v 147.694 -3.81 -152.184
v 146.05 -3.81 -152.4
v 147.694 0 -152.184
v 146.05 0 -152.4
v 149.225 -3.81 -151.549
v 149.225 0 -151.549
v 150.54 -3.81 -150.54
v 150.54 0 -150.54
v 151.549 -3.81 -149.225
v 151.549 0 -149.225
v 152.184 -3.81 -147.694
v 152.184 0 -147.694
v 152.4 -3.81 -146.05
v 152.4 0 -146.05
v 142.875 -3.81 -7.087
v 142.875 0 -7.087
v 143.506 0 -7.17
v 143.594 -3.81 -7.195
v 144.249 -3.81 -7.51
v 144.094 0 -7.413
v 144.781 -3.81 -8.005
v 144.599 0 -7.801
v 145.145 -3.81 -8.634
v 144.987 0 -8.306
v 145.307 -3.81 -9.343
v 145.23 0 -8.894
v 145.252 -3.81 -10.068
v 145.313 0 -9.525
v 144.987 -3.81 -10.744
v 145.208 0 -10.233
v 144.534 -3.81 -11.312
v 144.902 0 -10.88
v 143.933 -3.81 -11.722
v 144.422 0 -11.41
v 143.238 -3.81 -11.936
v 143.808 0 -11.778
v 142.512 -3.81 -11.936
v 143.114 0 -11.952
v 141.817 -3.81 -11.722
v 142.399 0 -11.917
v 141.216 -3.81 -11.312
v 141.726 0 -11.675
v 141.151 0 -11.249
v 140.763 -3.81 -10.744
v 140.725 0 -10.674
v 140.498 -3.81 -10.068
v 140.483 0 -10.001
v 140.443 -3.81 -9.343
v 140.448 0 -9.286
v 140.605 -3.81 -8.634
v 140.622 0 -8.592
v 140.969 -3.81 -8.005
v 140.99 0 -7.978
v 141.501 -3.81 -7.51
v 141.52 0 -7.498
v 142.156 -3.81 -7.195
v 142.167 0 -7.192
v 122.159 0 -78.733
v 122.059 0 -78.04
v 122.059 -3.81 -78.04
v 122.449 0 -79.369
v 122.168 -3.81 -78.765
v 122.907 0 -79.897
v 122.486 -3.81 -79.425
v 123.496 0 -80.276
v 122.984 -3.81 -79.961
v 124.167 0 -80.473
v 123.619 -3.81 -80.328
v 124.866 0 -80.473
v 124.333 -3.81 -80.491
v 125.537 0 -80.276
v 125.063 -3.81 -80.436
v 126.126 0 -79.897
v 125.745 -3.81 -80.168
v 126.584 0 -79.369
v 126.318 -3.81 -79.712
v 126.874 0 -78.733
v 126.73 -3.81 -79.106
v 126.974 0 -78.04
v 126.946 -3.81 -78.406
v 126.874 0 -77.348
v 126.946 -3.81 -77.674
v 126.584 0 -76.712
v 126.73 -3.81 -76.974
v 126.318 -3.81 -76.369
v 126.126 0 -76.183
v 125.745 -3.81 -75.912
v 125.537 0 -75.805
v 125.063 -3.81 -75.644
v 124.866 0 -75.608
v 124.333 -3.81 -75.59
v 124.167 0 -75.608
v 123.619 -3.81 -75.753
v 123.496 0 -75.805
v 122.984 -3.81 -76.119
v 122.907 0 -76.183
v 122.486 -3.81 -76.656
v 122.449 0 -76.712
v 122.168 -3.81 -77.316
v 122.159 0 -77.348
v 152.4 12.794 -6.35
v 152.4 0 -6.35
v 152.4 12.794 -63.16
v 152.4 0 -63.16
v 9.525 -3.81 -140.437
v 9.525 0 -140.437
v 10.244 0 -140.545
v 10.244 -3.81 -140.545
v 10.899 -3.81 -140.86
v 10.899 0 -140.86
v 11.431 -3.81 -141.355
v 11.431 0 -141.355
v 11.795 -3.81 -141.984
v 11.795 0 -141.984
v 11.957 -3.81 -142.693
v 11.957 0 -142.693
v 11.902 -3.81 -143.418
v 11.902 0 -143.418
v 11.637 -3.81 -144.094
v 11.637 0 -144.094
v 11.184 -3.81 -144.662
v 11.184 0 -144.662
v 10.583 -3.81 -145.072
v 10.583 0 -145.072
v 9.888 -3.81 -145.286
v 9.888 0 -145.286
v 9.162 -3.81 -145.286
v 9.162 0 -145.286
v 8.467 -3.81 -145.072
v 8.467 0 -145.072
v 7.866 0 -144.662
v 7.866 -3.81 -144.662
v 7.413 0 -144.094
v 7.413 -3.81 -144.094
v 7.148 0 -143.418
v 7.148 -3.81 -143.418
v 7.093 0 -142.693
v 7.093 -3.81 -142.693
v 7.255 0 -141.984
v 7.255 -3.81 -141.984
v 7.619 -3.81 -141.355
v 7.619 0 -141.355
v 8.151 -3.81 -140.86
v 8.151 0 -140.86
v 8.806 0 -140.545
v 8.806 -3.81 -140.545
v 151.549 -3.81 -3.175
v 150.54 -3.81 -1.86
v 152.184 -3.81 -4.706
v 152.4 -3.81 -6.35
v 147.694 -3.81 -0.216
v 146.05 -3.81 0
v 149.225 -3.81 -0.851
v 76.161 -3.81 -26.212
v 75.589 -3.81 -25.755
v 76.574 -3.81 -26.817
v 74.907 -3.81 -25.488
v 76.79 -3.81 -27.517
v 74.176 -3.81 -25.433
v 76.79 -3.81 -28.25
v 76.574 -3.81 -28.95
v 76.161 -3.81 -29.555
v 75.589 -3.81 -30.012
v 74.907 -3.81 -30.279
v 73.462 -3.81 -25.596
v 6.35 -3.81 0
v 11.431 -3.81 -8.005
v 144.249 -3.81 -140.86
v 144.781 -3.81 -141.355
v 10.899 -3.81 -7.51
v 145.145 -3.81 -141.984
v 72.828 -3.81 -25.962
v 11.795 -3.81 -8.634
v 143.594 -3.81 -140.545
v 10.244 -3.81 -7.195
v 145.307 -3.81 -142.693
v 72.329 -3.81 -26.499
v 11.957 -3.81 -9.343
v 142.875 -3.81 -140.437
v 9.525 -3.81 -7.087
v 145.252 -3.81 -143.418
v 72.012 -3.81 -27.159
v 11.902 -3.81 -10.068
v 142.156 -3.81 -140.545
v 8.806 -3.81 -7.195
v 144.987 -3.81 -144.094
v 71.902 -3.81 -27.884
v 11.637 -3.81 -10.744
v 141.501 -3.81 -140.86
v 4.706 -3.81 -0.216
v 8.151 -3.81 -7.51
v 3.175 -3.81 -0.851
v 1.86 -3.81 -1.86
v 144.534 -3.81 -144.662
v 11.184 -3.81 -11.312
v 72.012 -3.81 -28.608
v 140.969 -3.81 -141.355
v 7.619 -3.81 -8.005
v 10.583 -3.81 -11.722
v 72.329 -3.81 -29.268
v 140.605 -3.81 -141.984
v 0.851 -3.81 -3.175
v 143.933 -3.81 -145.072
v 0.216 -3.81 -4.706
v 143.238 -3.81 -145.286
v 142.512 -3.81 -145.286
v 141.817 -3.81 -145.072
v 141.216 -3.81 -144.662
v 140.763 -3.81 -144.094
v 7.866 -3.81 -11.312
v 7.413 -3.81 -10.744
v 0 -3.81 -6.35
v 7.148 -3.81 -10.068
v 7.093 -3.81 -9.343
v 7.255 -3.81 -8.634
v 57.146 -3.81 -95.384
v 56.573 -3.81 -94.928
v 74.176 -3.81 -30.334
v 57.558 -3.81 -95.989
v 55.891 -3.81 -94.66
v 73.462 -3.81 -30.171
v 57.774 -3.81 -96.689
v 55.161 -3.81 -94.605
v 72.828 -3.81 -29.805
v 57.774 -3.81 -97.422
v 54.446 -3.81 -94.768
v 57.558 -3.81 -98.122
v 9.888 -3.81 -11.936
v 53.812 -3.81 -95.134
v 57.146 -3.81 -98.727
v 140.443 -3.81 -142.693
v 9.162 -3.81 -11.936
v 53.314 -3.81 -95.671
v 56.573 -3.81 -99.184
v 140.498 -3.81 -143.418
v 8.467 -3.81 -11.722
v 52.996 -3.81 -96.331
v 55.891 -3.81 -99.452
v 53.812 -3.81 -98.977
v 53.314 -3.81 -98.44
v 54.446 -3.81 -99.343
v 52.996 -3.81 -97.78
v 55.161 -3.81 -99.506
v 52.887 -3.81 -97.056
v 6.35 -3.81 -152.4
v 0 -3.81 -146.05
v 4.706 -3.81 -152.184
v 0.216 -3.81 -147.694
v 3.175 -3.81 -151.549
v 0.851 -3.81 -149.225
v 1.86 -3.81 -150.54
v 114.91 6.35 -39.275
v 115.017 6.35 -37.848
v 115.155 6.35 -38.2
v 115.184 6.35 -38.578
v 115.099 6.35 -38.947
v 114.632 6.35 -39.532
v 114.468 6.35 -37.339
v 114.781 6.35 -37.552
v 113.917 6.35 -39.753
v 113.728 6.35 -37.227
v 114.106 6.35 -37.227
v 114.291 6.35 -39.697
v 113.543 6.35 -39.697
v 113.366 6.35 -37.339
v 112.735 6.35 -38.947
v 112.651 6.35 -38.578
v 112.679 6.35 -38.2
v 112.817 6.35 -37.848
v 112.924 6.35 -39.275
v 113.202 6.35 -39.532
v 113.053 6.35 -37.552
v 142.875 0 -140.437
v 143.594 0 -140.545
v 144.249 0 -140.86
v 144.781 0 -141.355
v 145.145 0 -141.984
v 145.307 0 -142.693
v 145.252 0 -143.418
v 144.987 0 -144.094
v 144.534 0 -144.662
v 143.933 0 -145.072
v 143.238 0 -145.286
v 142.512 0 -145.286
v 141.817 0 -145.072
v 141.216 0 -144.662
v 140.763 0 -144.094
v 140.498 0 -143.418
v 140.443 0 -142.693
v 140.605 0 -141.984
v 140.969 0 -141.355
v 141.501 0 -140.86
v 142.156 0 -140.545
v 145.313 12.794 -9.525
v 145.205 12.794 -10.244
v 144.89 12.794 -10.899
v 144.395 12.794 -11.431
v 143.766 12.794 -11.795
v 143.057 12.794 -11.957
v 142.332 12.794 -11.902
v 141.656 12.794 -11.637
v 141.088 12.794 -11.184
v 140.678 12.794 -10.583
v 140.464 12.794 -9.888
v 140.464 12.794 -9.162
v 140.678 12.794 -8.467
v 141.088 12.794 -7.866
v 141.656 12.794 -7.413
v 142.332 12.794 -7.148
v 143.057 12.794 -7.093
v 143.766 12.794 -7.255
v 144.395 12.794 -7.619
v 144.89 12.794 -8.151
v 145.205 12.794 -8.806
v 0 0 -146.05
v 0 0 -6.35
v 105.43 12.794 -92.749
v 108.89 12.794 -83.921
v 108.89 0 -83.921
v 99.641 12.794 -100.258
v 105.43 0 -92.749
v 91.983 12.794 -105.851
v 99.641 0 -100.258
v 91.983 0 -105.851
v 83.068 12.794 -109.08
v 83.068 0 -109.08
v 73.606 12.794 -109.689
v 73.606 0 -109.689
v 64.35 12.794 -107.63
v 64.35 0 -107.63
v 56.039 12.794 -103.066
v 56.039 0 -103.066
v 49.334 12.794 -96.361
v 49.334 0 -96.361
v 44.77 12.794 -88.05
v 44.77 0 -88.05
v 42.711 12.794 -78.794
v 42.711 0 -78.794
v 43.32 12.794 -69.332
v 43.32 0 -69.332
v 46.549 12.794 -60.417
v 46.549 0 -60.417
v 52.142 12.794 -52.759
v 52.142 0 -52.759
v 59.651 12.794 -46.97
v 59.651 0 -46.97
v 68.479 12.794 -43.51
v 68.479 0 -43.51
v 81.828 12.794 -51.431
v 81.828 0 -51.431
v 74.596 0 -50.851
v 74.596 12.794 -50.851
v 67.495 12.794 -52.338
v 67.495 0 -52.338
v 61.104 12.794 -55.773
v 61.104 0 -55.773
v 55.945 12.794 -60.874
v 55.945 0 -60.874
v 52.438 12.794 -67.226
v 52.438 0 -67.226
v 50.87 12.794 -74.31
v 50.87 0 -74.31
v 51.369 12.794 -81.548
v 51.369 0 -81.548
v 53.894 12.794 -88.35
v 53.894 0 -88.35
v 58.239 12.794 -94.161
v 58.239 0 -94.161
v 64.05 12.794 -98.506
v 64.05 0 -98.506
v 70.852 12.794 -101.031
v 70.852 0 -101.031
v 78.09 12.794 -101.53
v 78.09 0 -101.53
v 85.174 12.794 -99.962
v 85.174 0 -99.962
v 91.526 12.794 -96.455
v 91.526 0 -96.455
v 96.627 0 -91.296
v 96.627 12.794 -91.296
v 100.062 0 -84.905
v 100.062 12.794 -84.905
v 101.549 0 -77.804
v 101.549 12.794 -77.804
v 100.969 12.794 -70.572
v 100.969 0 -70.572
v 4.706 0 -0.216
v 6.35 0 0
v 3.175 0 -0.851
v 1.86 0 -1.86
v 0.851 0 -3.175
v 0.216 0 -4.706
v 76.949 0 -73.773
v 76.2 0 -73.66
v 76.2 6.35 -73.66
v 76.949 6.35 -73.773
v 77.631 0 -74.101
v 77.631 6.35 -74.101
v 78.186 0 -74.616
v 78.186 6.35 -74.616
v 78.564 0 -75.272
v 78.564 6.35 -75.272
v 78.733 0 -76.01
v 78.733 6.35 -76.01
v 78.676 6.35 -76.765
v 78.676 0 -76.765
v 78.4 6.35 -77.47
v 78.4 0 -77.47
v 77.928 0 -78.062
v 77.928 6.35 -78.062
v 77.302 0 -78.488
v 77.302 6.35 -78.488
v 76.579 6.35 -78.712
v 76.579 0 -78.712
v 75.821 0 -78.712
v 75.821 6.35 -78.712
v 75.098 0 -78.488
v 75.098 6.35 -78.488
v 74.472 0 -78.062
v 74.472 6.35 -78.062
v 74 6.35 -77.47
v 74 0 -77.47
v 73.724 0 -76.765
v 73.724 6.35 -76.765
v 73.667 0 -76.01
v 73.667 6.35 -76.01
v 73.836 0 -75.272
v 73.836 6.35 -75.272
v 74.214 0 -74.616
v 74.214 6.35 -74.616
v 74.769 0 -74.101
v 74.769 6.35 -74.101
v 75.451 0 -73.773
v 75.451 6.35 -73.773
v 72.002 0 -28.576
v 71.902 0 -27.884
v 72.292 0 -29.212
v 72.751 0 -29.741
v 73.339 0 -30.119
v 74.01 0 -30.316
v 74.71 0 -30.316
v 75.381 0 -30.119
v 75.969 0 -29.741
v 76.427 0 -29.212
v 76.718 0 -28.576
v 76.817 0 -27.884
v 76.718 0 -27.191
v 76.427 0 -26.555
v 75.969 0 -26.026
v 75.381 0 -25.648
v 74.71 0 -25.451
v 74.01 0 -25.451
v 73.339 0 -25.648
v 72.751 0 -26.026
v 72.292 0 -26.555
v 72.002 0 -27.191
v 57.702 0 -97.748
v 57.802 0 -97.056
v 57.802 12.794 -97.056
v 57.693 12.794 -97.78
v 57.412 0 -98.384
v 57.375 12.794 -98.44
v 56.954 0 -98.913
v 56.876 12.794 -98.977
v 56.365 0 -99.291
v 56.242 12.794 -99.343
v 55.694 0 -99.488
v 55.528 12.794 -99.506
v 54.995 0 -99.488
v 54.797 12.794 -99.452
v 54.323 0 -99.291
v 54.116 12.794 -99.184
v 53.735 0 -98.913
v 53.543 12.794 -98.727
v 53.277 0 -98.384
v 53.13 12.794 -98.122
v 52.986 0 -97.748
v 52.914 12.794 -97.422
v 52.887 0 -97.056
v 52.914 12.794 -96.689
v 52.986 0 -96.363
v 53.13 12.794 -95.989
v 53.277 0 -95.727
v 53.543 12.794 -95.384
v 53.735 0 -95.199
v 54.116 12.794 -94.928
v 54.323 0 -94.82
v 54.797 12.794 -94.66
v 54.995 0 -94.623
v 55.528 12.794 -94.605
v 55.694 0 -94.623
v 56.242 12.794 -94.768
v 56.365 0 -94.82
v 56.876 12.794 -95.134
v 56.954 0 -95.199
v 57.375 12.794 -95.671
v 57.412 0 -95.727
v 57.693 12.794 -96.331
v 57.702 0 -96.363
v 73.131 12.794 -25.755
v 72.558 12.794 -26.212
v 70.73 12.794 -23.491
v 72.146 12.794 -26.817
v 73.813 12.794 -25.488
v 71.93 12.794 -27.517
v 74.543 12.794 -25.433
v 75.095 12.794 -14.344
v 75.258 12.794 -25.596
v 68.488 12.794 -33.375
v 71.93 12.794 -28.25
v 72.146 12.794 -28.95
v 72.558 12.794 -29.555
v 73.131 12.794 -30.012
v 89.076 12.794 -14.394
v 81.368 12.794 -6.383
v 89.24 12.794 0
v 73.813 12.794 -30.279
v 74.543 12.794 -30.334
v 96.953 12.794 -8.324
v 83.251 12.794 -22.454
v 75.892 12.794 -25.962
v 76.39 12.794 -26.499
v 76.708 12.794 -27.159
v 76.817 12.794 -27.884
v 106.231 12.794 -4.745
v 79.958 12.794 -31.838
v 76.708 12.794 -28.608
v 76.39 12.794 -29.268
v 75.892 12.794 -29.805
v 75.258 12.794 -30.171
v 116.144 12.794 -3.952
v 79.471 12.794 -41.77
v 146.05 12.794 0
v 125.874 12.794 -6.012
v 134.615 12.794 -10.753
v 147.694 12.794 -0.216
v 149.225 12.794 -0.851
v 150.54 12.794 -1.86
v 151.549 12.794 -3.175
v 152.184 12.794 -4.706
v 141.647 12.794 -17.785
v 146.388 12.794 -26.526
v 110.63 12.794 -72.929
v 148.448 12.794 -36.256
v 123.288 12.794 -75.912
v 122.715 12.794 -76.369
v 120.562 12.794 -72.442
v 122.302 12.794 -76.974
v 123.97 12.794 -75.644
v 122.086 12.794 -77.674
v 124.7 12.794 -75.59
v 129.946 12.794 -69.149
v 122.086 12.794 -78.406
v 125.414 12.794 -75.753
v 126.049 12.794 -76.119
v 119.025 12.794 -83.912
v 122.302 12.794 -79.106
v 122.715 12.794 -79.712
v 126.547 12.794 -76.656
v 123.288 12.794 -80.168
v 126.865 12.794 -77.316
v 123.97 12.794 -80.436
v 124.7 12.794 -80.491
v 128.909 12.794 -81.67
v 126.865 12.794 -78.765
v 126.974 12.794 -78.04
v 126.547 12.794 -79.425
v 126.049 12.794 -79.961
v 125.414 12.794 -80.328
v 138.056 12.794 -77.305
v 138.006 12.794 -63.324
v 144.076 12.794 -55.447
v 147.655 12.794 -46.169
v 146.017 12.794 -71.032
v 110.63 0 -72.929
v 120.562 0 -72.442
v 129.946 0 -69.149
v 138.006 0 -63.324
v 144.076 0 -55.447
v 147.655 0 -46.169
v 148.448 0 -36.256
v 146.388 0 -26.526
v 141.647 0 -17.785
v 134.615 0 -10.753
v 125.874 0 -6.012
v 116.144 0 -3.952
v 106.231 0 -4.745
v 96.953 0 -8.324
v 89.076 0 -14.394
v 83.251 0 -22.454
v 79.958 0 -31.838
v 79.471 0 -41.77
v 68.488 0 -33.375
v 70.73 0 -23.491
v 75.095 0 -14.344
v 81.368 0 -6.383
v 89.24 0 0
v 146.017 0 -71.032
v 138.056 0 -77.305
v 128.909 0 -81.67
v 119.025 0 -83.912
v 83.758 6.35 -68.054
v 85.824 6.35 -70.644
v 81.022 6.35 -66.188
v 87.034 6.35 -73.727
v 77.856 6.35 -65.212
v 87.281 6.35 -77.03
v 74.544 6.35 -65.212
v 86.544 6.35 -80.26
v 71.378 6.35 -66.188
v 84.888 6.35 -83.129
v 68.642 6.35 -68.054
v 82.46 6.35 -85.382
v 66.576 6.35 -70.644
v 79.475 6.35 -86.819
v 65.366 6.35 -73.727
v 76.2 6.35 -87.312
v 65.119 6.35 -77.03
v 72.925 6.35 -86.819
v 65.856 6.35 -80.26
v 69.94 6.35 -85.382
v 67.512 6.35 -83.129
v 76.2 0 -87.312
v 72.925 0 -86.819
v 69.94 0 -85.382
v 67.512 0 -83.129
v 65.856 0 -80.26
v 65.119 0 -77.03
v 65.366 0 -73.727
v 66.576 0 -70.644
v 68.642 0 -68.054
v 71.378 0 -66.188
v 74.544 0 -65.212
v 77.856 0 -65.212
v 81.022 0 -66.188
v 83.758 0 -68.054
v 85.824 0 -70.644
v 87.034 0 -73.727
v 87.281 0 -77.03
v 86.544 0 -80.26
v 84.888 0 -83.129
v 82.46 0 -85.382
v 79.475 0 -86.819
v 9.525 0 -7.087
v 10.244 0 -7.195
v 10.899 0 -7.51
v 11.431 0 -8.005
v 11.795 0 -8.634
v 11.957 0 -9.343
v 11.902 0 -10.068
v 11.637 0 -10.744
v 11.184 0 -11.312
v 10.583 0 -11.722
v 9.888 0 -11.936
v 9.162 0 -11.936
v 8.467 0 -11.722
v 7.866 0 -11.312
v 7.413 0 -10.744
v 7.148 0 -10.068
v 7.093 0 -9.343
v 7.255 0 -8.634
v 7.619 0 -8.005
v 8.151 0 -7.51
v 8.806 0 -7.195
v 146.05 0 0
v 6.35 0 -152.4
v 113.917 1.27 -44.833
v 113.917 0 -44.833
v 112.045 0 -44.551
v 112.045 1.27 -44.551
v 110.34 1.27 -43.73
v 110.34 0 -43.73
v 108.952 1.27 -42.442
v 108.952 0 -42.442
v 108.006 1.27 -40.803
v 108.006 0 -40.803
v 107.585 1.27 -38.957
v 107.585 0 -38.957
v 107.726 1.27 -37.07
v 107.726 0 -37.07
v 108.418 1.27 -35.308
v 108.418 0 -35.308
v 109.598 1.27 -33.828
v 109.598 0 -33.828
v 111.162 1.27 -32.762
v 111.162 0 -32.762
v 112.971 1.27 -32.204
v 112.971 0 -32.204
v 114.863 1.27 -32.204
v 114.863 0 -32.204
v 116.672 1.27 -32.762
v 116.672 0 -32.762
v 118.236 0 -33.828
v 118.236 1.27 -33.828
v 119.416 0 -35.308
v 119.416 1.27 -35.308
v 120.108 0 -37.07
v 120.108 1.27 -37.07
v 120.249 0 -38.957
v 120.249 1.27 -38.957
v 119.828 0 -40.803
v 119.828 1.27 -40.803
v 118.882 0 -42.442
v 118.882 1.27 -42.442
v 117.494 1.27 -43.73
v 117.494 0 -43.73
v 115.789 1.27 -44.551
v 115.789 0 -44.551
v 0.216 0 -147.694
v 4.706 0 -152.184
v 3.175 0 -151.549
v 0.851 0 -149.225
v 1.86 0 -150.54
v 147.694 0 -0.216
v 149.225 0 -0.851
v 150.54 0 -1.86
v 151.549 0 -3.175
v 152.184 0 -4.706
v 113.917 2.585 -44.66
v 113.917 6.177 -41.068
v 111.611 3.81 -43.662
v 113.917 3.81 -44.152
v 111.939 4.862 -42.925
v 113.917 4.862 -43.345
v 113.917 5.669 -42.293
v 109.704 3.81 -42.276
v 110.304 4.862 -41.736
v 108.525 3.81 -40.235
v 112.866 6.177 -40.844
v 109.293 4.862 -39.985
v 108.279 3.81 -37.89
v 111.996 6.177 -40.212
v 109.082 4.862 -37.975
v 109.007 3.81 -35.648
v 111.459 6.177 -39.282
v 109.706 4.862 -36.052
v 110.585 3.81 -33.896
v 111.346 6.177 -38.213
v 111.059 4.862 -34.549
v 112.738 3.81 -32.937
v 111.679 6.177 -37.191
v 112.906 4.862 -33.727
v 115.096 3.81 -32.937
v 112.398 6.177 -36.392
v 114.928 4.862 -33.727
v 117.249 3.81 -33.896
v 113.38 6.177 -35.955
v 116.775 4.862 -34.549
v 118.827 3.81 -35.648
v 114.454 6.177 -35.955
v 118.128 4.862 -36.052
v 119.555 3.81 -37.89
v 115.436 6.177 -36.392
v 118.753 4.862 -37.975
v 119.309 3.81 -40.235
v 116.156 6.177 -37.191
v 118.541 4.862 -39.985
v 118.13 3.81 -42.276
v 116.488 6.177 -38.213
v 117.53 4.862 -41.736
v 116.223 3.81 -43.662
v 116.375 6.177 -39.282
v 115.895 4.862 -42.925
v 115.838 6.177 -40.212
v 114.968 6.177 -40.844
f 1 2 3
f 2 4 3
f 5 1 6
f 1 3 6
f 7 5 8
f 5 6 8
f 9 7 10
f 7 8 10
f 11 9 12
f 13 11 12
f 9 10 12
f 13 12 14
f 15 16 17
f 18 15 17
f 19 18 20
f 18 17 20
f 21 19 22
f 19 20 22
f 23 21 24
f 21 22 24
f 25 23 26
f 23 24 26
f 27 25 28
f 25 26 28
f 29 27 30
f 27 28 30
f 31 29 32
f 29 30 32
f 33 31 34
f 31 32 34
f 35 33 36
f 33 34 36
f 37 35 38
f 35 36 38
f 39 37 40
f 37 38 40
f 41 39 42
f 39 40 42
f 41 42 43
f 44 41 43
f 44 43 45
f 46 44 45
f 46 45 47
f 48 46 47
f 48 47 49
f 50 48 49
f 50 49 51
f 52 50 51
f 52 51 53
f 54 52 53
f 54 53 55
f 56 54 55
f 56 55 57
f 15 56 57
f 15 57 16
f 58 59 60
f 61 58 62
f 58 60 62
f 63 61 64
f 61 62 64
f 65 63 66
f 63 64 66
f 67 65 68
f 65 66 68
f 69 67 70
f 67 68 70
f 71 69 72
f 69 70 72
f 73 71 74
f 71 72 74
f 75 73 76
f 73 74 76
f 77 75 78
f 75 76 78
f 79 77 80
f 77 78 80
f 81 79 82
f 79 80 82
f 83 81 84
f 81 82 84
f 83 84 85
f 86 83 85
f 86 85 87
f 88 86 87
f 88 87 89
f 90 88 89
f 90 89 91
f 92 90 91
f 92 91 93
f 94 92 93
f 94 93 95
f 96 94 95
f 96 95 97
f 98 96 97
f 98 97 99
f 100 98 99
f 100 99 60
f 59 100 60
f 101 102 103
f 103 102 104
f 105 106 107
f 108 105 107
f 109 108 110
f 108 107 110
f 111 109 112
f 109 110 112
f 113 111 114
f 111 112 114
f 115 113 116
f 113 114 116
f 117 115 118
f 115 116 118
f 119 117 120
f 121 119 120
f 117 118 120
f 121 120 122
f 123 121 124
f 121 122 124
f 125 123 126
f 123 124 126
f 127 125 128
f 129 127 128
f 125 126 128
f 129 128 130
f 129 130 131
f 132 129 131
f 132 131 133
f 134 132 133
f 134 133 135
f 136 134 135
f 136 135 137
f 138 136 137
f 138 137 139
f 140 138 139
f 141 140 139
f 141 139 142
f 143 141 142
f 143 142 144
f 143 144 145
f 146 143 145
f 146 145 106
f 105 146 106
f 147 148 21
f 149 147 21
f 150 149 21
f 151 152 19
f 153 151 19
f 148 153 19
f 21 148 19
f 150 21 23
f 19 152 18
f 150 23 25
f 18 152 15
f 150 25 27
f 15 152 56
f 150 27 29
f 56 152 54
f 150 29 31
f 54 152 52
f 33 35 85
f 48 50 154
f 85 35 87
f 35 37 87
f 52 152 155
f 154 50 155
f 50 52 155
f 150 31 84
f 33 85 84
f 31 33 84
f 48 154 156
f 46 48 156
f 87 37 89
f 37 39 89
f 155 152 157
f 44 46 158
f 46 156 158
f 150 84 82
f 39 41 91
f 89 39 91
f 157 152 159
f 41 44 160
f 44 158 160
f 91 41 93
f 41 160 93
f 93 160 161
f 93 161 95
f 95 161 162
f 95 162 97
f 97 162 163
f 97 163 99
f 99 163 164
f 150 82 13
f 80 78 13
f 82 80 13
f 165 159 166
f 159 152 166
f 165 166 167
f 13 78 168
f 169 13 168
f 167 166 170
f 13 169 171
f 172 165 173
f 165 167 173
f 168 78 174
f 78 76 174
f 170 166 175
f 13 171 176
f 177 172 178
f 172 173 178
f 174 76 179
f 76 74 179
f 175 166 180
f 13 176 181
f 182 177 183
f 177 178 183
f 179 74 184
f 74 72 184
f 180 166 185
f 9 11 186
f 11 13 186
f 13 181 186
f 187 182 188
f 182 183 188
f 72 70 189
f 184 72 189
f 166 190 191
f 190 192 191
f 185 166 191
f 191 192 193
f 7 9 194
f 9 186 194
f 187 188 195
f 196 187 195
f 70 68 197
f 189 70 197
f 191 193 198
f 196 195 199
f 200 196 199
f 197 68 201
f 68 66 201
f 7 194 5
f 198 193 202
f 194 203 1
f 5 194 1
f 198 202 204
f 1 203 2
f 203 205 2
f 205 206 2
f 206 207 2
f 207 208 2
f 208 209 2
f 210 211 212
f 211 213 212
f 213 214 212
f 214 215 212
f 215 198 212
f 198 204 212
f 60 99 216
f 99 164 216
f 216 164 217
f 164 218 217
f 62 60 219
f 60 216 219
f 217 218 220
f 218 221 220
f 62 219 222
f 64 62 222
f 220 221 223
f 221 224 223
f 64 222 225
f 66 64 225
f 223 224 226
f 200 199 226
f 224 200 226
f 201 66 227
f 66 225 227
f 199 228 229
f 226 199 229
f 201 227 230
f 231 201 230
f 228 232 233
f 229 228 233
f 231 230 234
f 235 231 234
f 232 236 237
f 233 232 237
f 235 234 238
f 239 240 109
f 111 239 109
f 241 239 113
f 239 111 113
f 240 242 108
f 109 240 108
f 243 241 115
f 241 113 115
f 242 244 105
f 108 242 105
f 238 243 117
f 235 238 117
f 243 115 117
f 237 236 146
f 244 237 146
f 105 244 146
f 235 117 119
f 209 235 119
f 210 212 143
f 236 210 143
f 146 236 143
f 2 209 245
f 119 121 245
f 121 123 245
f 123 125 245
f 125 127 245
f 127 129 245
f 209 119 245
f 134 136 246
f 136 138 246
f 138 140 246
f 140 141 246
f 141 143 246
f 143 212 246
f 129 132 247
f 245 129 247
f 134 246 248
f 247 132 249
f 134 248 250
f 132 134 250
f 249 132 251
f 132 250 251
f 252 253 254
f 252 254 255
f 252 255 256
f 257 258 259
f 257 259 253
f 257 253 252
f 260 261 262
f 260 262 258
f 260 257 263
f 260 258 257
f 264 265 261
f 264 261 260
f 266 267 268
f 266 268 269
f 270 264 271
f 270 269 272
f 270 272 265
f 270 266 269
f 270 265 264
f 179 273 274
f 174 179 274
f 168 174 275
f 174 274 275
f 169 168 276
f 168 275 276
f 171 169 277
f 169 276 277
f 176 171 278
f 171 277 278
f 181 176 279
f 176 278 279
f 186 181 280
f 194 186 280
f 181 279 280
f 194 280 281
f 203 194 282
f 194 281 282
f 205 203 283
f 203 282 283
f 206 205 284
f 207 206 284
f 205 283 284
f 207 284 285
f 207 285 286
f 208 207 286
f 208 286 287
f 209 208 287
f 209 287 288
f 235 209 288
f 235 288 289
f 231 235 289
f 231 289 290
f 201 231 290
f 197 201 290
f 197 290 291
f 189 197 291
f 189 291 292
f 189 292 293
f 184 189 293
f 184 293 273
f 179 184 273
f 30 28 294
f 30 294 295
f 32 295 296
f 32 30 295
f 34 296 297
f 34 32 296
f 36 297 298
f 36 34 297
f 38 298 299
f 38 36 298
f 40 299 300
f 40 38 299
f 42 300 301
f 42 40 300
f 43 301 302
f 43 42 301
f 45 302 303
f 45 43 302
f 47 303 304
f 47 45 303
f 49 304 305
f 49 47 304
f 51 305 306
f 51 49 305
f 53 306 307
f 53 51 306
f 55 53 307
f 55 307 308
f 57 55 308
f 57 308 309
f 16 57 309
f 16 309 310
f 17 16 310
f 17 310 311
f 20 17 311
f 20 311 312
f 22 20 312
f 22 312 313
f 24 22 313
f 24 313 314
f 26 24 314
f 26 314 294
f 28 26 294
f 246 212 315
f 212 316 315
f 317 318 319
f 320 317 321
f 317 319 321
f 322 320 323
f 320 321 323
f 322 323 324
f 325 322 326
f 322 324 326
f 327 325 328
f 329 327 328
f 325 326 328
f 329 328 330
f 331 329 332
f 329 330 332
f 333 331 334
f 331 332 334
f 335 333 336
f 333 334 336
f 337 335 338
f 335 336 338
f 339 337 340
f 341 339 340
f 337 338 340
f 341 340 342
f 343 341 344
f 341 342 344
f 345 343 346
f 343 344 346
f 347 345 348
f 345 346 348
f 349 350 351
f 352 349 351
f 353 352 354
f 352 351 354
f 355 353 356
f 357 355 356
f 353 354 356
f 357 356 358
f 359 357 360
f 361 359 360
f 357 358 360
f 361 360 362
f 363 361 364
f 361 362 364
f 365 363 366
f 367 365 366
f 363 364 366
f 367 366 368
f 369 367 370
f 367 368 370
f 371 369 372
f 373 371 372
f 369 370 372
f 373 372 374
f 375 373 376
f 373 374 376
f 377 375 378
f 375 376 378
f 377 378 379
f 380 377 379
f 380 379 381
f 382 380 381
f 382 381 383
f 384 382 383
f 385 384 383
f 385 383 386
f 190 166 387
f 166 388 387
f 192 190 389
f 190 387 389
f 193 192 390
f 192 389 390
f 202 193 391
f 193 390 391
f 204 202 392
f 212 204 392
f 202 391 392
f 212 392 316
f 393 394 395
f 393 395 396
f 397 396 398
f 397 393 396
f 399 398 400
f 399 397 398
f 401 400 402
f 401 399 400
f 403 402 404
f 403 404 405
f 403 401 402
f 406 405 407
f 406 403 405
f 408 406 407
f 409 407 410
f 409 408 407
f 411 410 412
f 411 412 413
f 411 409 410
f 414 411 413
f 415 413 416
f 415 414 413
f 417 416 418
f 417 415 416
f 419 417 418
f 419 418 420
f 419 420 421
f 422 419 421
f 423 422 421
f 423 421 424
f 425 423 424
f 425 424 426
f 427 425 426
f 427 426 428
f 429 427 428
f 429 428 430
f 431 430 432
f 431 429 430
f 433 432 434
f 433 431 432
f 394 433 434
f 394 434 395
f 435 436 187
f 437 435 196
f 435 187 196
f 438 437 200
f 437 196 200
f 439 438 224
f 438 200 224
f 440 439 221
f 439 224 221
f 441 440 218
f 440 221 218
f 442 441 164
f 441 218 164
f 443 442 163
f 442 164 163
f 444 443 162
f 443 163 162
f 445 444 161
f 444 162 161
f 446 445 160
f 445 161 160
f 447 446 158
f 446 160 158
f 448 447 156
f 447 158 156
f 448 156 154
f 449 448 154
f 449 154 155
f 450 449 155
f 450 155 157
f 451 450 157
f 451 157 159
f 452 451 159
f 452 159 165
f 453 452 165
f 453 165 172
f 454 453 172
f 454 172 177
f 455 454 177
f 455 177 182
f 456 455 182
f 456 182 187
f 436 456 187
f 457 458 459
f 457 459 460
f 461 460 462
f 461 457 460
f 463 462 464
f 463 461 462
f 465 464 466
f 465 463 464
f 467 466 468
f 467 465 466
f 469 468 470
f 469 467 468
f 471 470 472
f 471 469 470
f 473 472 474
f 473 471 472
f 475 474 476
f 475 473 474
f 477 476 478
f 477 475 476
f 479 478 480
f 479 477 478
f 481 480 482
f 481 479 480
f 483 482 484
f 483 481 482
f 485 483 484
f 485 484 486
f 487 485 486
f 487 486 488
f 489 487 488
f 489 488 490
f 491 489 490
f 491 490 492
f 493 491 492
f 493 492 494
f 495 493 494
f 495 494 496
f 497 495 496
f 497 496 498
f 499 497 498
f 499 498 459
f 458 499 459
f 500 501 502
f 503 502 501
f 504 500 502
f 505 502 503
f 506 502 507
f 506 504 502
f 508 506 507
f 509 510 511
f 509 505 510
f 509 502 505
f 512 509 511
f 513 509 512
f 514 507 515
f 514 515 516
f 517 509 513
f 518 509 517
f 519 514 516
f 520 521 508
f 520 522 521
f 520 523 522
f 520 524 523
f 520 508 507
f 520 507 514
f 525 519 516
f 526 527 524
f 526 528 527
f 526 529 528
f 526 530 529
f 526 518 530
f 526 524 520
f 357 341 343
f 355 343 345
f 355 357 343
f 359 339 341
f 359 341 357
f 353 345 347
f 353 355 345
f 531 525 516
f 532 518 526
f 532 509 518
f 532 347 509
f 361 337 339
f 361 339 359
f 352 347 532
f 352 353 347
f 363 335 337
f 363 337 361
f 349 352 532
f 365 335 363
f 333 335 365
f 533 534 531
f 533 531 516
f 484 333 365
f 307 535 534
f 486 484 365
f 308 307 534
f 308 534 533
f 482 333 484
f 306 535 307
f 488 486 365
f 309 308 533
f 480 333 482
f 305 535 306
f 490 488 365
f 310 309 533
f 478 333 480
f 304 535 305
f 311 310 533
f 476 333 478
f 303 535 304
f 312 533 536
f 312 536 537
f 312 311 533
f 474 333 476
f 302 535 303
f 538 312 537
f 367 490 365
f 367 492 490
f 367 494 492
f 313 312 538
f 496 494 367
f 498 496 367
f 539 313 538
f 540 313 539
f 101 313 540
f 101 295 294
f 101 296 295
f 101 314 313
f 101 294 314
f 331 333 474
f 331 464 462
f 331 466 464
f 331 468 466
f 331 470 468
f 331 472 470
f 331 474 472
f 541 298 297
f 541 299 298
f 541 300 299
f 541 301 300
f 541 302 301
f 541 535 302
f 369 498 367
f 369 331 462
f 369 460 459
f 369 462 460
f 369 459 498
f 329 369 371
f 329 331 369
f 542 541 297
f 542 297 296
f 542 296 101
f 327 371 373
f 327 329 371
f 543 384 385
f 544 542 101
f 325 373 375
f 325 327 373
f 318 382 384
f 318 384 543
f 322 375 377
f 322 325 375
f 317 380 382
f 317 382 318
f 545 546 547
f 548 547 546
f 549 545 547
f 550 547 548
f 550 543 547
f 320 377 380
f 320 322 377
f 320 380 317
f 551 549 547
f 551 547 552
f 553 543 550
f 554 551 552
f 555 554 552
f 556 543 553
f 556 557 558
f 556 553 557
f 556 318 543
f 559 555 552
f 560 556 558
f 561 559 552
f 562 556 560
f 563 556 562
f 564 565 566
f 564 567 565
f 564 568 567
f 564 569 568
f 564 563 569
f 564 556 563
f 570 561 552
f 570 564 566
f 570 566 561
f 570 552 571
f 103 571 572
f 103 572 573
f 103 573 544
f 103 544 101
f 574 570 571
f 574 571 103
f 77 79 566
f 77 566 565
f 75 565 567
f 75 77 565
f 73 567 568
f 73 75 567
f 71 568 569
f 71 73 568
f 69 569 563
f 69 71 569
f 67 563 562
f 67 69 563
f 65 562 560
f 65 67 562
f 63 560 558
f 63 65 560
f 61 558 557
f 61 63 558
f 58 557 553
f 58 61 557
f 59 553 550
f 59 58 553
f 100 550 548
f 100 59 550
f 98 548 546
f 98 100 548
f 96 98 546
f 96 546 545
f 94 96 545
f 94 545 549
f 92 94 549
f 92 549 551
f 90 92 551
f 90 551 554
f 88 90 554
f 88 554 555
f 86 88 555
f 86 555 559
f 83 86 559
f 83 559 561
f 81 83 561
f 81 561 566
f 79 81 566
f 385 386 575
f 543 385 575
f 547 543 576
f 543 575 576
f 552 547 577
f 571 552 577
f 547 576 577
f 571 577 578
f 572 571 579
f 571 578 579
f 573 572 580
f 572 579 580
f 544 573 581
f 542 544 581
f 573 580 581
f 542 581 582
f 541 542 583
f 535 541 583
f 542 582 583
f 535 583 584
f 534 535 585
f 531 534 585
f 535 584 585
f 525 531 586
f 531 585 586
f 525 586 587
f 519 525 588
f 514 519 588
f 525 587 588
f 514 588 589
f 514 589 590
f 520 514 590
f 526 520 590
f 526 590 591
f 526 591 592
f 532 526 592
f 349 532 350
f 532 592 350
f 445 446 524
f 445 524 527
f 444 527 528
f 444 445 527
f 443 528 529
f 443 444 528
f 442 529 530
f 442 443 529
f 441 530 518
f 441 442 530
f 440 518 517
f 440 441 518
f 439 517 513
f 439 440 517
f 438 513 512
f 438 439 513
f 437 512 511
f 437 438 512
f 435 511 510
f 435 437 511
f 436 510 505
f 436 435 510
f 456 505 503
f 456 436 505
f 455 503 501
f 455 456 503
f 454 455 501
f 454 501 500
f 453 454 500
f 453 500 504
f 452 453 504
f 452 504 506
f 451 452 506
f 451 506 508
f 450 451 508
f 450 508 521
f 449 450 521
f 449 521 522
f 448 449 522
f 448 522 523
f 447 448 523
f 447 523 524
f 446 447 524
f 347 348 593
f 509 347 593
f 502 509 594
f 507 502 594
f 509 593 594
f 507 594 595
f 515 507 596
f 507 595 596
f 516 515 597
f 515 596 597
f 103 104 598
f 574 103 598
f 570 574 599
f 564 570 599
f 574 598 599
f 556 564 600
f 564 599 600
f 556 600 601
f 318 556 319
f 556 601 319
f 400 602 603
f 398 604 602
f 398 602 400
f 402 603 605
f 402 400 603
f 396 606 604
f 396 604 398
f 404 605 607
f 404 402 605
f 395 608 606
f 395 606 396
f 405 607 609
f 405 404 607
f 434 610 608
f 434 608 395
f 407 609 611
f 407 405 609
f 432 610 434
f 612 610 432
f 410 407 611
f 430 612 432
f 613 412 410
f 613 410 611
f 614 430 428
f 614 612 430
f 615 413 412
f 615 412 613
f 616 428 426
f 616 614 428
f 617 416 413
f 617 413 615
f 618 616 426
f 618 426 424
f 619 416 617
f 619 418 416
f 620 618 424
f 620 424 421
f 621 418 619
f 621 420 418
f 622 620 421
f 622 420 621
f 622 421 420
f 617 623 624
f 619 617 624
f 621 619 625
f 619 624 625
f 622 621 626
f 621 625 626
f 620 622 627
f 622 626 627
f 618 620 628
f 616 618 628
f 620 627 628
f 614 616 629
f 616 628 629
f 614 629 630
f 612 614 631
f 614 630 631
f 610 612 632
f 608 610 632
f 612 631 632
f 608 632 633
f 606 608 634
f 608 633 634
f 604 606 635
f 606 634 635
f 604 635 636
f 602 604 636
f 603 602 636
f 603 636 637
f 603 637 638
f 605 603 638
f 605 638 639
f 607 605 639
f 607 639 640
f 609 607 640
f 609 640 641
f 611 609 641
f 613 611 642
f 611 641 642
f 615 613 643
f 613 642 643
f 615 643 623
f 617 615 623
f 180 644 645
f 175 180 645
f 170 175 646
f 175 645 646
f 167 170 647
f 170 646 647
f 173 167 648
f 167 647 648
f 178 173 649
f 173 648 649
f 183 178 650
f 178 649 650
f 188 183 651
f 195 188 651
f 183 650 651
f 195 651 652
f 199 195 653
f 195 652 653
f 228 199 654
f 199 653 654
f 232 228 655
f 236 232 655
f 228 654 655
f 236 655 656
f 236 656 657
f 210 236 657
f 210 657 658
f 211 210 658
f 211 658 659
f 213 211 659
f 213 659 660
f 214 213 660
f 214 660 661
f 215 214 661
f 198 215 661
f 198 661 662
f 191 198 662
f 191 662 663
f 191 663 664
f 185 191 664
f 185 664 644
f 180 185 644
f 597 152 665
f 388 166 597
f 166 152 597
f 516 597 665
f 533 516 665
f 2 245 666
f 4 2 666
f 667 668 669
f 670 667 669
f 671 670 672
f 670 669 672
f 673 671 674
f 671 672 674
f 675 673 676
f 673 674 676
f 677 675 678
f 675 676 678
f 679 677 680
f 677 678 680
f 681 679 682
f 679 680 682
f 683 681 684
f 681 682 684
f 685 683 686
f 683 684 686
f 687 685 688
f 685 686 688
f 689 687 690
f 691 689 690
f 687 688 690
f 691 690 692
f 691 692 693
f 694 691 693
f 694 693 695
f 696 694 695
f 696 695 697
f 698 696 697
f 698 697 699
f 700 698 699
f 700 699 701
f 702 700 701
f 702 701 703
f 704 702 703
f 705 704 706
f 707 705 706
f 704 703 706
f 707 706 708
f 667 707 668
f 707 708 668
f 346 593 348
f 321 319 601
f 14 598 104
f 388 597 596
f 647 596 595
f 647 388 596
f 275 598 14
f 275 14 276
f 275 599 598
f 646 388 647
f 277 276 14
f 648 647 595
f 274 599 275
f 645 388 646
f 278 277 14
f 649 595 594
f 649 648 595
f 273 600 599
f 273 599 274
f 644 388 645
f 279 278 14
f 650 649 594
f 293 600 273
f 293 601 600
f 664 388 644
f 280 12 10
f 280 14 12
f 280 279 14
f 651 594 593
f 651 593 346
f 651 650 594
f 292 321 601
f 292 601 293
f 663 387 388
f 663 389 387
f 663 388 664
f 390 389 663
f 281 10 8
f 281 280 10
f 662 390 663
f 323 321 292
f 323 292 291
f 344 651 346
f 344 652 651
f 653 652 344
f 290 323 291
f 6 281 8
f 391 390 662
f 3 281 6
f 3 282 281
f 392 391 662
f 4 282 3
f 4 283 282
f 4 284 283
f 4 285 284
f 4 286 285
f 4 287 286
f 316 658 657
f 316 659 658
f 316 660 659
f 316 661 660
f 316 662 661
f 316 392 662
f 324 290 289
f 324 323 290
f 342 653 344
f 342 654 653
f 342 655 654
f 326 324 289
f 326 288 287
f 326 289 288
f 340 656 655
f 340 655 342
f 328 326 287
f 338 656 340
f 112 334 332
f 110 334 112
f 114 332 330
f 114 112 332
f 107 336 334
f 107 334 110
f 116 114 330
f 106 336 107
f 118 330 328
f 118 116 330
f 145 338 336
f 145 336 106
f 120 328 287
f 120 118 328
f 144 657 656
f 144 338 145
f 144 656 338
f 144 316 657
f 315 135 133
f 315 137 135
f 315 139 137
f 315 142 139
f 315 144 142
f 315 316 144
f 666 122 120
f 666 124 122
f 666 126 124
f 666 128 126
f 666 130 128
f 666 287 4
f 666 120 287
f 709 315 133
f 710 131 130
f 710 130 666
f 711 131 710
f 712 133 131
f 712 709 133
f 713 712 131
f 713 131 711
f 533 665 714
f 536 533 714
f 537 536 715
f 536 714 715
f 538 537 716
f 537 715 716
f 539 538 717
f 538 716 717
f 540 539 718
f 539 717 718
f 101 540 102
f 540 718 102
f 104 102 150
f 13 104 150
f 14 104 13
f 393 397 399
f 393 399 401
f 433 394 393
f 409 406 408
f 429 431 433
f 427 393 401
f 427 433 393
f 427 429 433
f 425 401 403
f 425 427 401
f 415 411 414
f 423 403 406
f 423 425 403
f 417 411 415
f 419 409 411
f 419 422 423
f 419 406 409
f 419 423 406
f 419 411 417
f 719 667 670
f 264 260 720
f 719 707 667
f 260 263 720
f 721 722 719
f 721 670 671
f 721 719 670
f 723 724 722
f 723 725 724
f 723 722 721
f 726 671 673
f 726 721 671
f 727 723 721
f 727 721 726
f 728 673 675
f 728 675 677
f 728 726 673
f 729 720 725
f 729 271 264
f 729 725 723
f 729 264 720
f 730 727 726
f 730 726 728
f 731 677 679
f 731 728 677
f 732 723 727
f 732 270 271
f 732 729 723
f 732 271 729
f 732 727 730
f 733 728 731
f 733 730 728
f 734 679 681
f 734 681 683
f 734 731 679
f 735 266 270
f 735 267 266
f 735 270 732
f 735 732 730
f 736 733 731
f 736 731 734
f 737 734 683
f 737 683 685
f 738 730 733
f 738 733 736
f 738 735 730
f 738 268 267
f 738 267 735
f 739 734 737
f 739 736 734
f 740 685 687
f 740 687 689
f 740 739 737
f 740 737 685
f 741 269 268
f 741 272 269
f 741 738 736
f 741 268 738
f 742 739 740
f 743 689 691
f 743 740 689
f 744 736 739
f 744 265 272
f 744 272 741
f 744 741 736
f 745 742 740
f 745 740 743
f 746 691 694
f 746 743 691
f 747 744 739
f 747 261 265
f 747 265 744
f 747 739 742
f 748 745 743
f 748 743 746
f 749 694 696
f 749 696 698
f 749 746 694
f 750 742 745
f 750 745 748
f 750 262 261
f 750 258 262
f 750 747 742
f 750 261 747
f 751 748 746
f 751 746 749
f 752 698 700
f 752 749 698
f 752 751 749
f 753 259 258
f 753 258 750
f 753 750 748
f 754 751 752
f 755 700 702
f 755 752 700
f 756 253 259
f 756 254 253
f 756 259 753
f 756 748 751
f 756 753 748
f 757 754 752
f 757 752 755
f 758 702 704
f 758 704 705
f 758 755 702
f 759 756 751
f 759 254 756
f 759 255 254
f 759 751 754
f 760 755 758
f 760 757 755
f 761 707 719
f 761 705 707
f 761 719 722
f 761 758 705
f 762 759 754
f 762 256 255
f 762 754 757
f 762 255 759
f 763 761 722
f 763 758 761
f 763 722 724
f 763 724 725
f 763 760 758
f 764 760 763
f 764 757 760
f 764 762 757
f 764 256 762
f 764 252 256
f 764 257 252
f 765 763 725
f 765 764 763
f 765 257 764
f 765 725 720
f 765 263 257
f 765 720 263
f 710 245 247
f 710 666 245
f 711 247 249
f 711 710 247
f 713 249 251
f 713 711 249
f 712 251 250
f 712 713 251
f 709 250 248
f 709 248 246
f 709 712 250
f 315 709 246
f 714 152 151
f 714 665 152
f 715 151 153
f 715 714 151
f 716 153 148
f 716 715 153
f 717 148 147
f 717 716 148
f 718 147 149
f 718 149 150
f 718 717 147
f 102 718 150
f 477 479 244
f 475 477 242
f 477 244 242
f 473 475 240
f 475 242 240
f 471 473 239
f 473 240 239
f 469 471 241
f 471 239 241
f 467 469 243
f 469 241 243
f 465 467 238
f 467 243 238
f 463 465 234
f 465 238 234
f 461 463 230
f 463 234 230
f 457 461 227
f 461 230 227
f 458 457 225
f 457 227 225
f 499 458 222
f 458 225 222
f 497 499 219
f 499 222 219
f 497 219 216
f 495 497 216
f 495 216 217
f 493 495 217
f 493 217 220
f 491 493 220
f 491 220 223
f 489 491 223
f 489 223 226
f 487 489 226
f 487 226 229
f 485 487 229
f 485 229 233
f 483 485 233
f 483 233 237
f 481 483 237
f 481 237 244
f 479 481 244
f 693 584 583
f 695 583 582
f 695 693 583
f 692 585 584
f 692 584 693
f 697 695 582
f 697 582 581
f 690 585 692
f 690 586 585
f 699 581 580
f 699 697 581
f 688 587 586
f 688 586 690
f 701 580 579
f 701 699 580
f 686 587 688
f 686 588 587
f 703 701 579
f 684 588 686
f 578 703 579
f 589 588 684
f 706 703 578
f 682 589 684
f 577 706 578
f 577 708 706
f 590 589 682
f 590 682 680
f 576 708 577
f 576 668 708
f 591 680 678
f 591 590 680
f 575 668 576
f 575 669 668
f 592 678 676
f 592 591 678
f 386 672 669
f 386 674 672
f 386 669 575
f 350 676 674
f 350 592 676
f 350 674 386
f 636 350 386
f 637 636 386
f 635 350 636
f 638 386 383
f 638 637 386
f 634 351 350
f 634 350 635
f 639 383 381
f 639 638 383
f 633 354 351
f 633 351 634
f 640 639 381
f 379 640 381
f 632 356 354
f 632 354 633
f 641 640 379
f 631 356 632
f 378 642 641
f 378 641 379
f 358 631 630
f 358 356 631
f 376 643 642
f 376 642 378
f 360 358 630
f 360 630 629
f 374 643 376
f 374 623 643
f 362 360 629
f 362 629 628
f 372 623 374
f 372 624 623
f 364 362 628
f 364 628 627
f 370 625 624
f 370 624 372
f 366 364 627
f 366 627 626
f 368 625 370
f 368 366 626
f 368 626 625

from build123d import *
from build123d.topology import SkipClean

# Parameters (mm, degrees)
SKETCH1_W                    = 152.4
SKETCH1_H                    = 3.81
MAIN_FRAME_DEPTH             = 152.4
FILLET1_R                    = 6.35
SKETCH3_R                    = 6.35
POT_GEAR_SNUB_NUB_DEPTH      = 6.35
SKETCH3_6_R                  = 11.1125
SKETCH3_6_R_2                = 2.54
BASE_SNUB_NUB_DEPTH          = 6.35
SKETCH7_R                    = 2.4384
CORNER_MOUNTING_HOLES_DEPTH  = 216.619670949
FILLET2_R                    = 5.08
F_10_0_1935_DIAMETER_HOLE1_D = 4.9149
BOSS_EXTRUDE2_OUTLINE_R      = 2.45745
BOSS_EXTRUDE2_OUTLINE_R_2    = 2.4384
BOSS_EXTRUDE2_DEPTH          = 12.794


# Read off the part's stored shape, not the designer's step: Boss-Extrude2
with BuildPart() as part:
    # Sketch1 → Main Frame (new body)
    with BuildSketch(Plane(origin=(0, 0, 0), x_dir=(0, 0, -1), z_dir=(1, 0, 0))):
        with Locations((76.2, -1.905)):
            Rectangle(SKETCH1_W, SKETCH1_H)
    extrude(amount=MAIN_FRAME_DEPTH)

    # Fillet1
    fillet1_edges = [part.edges().sort_by_distance(p)[0] for p in [
        (152.4, -1.905, -152.4),
        (152.4, -1.905, 0),
        (0, -1.905, -152.4),
        (0, -1.905, 0),
    ]]
    fillet(fillet1_edges, radius=FILLET1_R)

    # Sketch3 → Pot Gear Snub Nub (add)
    with BuildSketch(Plane(origin=(0, 0, 0), x_dir=(1, 0, 0), z_dir=(0, 1, 0))):
        with Locations(Location((113.917075708, 38.482924292, 0), (0, 0, 90))):
            Circle(SKETCH3_R)
    extrude(amount=POT_GEAR_SNUB_NUB_DEPTH)

    # Sketch3<6> → Base Snub Nub (add)
    with BuildSketch(Plane(origin=(0, 0, 0), x_dir=(1, 0, 0), z_dir=(0, 1, 0))):
        with Locations(Location((76.2, 76.2, 0), (0, 0, 90))):
            Circle(SKETCH3_6_R)
        with Locations(Location((76.2, 76.2, 0), (0, 0, 270))):
            Circle(SKETCH3_6_R_2, mode=Mode.SUBTRACT)
    extrude(amount=BASE_SNUB_NUB_DEPTH)

    # Sketch7 → Corner Mounting Holes (cut, through all)
    with BuildSketch(Plane(origin=(0, 0, 0), x_dir=(1, 0, 0), z_dir=(0, 1, 0))):
        with Locations(Location((142.875, 142.875, 0), (0, 0, 270))):
            Circle(SKETCH7_R)
        with Locations(Location((142.875, 9.525, 0), (0, 0, 270))):
            Circle(SKETCH7_R)
        with Locations(Location((9.525, 9.525, 0), (0, 0, 270))):
            Circle(SKETCH7_R)
        with Locations(Location((9.525, 142.875, 0), (0, 0, 270))):
            Circle(SKETCH7_R)
    extrude(amount=-CORNER_MOUNTING_HOLES_DEPTH, mode=Mode.SUBTRACT)

    # Fillet2
    fillet2_edges = [part.edges().sort_by_distance(p)[0] for p in [
        (113.917075708, 6.35, -32.132924292),
    ]]
    fillet(fillet2_edges, radius=FILLET2_R)

    # #10 (0.1935) Diameter Hole1 (through all)
    with Locations(Plane(origin=(0, 0, 0), x_dir=(1, 0, 0), z_dir=(0, 1, 0))):
        with Locations((124.51641164, 78.040184515), (74.359815485, 27.88358836), (55.344253184, 97.055746816)):
            Hole(F_10_0_1935_DIAMETER_HOLE1_D / 2)

    # Boss-Extrude2 outline → Boss-Extrude2 (add)
    with SkipClean():  # the faces are left unmerged after this step: merging them gives an invalid solid
        with BuildSketch(Plane(origin=(0, 0, 0), x_dir=(1, 0, 0), z_dir=(0, 1, 0))):
            with BuildLine():
                ThreePointArc((108.890253115, 83.92089943), (52.448527028, 99.951472972), (68.47910057, 43.509746885))
                ThreePointArc((68.47910057, 43.509746885), (72.658210549, 18.795756494), (89.240303876, 0))
                Line((89.240303876, 0), (146.05, 0))
                ThreePointArc((146.05, 0), (150.540128061, 1.859871939), (152.4, 6.35))
                Line((152.4, 6.35), (152.4, 63.159696124))
                ThreePointArc((152.4, 63.159696124), (133.604243506, 79.741789451), (108.890253115, 83.92089943))
            make_face()
            with Locations((74.359815485, 27.88358836)):
                Circle(BOSS_EXTRUDE2_OUTLINE_R, mode=Mode.SUBTRACT)
            with Locations((142.875, 9.525)):
                Circle(BOSS_EXTRUDE2_OUTLINE_R_2, mode=Mode.SUBTRACT)
            with BuildLine():
                ThreePointArc((81.82842228, 51.431454168), (58.239487758, 94.160512242), (100.968545832, 70.57157772))
                ThreePointArc((100.968545832, 70.57157772), (138.384871939, 14.015128061), (81.82842228, 51.431454168))
            make_face(mode=Mode.SUBTRACT)
            with Locations((55.344253184, 97.055746816)):
                Circle(BOSS_EXTRUDE2_OUTLINE_R, mode=Mode.SUBTRACT)
            with Locations((124.51641164, 78.040184515)):
                Circle(BOSS_EXTRUDE2_OUTLINE_R, mode=Mode.SUBTRACT)
        extrude(amount=BOSS_EXTRUDE2_DEPTH)


solid = part.part
